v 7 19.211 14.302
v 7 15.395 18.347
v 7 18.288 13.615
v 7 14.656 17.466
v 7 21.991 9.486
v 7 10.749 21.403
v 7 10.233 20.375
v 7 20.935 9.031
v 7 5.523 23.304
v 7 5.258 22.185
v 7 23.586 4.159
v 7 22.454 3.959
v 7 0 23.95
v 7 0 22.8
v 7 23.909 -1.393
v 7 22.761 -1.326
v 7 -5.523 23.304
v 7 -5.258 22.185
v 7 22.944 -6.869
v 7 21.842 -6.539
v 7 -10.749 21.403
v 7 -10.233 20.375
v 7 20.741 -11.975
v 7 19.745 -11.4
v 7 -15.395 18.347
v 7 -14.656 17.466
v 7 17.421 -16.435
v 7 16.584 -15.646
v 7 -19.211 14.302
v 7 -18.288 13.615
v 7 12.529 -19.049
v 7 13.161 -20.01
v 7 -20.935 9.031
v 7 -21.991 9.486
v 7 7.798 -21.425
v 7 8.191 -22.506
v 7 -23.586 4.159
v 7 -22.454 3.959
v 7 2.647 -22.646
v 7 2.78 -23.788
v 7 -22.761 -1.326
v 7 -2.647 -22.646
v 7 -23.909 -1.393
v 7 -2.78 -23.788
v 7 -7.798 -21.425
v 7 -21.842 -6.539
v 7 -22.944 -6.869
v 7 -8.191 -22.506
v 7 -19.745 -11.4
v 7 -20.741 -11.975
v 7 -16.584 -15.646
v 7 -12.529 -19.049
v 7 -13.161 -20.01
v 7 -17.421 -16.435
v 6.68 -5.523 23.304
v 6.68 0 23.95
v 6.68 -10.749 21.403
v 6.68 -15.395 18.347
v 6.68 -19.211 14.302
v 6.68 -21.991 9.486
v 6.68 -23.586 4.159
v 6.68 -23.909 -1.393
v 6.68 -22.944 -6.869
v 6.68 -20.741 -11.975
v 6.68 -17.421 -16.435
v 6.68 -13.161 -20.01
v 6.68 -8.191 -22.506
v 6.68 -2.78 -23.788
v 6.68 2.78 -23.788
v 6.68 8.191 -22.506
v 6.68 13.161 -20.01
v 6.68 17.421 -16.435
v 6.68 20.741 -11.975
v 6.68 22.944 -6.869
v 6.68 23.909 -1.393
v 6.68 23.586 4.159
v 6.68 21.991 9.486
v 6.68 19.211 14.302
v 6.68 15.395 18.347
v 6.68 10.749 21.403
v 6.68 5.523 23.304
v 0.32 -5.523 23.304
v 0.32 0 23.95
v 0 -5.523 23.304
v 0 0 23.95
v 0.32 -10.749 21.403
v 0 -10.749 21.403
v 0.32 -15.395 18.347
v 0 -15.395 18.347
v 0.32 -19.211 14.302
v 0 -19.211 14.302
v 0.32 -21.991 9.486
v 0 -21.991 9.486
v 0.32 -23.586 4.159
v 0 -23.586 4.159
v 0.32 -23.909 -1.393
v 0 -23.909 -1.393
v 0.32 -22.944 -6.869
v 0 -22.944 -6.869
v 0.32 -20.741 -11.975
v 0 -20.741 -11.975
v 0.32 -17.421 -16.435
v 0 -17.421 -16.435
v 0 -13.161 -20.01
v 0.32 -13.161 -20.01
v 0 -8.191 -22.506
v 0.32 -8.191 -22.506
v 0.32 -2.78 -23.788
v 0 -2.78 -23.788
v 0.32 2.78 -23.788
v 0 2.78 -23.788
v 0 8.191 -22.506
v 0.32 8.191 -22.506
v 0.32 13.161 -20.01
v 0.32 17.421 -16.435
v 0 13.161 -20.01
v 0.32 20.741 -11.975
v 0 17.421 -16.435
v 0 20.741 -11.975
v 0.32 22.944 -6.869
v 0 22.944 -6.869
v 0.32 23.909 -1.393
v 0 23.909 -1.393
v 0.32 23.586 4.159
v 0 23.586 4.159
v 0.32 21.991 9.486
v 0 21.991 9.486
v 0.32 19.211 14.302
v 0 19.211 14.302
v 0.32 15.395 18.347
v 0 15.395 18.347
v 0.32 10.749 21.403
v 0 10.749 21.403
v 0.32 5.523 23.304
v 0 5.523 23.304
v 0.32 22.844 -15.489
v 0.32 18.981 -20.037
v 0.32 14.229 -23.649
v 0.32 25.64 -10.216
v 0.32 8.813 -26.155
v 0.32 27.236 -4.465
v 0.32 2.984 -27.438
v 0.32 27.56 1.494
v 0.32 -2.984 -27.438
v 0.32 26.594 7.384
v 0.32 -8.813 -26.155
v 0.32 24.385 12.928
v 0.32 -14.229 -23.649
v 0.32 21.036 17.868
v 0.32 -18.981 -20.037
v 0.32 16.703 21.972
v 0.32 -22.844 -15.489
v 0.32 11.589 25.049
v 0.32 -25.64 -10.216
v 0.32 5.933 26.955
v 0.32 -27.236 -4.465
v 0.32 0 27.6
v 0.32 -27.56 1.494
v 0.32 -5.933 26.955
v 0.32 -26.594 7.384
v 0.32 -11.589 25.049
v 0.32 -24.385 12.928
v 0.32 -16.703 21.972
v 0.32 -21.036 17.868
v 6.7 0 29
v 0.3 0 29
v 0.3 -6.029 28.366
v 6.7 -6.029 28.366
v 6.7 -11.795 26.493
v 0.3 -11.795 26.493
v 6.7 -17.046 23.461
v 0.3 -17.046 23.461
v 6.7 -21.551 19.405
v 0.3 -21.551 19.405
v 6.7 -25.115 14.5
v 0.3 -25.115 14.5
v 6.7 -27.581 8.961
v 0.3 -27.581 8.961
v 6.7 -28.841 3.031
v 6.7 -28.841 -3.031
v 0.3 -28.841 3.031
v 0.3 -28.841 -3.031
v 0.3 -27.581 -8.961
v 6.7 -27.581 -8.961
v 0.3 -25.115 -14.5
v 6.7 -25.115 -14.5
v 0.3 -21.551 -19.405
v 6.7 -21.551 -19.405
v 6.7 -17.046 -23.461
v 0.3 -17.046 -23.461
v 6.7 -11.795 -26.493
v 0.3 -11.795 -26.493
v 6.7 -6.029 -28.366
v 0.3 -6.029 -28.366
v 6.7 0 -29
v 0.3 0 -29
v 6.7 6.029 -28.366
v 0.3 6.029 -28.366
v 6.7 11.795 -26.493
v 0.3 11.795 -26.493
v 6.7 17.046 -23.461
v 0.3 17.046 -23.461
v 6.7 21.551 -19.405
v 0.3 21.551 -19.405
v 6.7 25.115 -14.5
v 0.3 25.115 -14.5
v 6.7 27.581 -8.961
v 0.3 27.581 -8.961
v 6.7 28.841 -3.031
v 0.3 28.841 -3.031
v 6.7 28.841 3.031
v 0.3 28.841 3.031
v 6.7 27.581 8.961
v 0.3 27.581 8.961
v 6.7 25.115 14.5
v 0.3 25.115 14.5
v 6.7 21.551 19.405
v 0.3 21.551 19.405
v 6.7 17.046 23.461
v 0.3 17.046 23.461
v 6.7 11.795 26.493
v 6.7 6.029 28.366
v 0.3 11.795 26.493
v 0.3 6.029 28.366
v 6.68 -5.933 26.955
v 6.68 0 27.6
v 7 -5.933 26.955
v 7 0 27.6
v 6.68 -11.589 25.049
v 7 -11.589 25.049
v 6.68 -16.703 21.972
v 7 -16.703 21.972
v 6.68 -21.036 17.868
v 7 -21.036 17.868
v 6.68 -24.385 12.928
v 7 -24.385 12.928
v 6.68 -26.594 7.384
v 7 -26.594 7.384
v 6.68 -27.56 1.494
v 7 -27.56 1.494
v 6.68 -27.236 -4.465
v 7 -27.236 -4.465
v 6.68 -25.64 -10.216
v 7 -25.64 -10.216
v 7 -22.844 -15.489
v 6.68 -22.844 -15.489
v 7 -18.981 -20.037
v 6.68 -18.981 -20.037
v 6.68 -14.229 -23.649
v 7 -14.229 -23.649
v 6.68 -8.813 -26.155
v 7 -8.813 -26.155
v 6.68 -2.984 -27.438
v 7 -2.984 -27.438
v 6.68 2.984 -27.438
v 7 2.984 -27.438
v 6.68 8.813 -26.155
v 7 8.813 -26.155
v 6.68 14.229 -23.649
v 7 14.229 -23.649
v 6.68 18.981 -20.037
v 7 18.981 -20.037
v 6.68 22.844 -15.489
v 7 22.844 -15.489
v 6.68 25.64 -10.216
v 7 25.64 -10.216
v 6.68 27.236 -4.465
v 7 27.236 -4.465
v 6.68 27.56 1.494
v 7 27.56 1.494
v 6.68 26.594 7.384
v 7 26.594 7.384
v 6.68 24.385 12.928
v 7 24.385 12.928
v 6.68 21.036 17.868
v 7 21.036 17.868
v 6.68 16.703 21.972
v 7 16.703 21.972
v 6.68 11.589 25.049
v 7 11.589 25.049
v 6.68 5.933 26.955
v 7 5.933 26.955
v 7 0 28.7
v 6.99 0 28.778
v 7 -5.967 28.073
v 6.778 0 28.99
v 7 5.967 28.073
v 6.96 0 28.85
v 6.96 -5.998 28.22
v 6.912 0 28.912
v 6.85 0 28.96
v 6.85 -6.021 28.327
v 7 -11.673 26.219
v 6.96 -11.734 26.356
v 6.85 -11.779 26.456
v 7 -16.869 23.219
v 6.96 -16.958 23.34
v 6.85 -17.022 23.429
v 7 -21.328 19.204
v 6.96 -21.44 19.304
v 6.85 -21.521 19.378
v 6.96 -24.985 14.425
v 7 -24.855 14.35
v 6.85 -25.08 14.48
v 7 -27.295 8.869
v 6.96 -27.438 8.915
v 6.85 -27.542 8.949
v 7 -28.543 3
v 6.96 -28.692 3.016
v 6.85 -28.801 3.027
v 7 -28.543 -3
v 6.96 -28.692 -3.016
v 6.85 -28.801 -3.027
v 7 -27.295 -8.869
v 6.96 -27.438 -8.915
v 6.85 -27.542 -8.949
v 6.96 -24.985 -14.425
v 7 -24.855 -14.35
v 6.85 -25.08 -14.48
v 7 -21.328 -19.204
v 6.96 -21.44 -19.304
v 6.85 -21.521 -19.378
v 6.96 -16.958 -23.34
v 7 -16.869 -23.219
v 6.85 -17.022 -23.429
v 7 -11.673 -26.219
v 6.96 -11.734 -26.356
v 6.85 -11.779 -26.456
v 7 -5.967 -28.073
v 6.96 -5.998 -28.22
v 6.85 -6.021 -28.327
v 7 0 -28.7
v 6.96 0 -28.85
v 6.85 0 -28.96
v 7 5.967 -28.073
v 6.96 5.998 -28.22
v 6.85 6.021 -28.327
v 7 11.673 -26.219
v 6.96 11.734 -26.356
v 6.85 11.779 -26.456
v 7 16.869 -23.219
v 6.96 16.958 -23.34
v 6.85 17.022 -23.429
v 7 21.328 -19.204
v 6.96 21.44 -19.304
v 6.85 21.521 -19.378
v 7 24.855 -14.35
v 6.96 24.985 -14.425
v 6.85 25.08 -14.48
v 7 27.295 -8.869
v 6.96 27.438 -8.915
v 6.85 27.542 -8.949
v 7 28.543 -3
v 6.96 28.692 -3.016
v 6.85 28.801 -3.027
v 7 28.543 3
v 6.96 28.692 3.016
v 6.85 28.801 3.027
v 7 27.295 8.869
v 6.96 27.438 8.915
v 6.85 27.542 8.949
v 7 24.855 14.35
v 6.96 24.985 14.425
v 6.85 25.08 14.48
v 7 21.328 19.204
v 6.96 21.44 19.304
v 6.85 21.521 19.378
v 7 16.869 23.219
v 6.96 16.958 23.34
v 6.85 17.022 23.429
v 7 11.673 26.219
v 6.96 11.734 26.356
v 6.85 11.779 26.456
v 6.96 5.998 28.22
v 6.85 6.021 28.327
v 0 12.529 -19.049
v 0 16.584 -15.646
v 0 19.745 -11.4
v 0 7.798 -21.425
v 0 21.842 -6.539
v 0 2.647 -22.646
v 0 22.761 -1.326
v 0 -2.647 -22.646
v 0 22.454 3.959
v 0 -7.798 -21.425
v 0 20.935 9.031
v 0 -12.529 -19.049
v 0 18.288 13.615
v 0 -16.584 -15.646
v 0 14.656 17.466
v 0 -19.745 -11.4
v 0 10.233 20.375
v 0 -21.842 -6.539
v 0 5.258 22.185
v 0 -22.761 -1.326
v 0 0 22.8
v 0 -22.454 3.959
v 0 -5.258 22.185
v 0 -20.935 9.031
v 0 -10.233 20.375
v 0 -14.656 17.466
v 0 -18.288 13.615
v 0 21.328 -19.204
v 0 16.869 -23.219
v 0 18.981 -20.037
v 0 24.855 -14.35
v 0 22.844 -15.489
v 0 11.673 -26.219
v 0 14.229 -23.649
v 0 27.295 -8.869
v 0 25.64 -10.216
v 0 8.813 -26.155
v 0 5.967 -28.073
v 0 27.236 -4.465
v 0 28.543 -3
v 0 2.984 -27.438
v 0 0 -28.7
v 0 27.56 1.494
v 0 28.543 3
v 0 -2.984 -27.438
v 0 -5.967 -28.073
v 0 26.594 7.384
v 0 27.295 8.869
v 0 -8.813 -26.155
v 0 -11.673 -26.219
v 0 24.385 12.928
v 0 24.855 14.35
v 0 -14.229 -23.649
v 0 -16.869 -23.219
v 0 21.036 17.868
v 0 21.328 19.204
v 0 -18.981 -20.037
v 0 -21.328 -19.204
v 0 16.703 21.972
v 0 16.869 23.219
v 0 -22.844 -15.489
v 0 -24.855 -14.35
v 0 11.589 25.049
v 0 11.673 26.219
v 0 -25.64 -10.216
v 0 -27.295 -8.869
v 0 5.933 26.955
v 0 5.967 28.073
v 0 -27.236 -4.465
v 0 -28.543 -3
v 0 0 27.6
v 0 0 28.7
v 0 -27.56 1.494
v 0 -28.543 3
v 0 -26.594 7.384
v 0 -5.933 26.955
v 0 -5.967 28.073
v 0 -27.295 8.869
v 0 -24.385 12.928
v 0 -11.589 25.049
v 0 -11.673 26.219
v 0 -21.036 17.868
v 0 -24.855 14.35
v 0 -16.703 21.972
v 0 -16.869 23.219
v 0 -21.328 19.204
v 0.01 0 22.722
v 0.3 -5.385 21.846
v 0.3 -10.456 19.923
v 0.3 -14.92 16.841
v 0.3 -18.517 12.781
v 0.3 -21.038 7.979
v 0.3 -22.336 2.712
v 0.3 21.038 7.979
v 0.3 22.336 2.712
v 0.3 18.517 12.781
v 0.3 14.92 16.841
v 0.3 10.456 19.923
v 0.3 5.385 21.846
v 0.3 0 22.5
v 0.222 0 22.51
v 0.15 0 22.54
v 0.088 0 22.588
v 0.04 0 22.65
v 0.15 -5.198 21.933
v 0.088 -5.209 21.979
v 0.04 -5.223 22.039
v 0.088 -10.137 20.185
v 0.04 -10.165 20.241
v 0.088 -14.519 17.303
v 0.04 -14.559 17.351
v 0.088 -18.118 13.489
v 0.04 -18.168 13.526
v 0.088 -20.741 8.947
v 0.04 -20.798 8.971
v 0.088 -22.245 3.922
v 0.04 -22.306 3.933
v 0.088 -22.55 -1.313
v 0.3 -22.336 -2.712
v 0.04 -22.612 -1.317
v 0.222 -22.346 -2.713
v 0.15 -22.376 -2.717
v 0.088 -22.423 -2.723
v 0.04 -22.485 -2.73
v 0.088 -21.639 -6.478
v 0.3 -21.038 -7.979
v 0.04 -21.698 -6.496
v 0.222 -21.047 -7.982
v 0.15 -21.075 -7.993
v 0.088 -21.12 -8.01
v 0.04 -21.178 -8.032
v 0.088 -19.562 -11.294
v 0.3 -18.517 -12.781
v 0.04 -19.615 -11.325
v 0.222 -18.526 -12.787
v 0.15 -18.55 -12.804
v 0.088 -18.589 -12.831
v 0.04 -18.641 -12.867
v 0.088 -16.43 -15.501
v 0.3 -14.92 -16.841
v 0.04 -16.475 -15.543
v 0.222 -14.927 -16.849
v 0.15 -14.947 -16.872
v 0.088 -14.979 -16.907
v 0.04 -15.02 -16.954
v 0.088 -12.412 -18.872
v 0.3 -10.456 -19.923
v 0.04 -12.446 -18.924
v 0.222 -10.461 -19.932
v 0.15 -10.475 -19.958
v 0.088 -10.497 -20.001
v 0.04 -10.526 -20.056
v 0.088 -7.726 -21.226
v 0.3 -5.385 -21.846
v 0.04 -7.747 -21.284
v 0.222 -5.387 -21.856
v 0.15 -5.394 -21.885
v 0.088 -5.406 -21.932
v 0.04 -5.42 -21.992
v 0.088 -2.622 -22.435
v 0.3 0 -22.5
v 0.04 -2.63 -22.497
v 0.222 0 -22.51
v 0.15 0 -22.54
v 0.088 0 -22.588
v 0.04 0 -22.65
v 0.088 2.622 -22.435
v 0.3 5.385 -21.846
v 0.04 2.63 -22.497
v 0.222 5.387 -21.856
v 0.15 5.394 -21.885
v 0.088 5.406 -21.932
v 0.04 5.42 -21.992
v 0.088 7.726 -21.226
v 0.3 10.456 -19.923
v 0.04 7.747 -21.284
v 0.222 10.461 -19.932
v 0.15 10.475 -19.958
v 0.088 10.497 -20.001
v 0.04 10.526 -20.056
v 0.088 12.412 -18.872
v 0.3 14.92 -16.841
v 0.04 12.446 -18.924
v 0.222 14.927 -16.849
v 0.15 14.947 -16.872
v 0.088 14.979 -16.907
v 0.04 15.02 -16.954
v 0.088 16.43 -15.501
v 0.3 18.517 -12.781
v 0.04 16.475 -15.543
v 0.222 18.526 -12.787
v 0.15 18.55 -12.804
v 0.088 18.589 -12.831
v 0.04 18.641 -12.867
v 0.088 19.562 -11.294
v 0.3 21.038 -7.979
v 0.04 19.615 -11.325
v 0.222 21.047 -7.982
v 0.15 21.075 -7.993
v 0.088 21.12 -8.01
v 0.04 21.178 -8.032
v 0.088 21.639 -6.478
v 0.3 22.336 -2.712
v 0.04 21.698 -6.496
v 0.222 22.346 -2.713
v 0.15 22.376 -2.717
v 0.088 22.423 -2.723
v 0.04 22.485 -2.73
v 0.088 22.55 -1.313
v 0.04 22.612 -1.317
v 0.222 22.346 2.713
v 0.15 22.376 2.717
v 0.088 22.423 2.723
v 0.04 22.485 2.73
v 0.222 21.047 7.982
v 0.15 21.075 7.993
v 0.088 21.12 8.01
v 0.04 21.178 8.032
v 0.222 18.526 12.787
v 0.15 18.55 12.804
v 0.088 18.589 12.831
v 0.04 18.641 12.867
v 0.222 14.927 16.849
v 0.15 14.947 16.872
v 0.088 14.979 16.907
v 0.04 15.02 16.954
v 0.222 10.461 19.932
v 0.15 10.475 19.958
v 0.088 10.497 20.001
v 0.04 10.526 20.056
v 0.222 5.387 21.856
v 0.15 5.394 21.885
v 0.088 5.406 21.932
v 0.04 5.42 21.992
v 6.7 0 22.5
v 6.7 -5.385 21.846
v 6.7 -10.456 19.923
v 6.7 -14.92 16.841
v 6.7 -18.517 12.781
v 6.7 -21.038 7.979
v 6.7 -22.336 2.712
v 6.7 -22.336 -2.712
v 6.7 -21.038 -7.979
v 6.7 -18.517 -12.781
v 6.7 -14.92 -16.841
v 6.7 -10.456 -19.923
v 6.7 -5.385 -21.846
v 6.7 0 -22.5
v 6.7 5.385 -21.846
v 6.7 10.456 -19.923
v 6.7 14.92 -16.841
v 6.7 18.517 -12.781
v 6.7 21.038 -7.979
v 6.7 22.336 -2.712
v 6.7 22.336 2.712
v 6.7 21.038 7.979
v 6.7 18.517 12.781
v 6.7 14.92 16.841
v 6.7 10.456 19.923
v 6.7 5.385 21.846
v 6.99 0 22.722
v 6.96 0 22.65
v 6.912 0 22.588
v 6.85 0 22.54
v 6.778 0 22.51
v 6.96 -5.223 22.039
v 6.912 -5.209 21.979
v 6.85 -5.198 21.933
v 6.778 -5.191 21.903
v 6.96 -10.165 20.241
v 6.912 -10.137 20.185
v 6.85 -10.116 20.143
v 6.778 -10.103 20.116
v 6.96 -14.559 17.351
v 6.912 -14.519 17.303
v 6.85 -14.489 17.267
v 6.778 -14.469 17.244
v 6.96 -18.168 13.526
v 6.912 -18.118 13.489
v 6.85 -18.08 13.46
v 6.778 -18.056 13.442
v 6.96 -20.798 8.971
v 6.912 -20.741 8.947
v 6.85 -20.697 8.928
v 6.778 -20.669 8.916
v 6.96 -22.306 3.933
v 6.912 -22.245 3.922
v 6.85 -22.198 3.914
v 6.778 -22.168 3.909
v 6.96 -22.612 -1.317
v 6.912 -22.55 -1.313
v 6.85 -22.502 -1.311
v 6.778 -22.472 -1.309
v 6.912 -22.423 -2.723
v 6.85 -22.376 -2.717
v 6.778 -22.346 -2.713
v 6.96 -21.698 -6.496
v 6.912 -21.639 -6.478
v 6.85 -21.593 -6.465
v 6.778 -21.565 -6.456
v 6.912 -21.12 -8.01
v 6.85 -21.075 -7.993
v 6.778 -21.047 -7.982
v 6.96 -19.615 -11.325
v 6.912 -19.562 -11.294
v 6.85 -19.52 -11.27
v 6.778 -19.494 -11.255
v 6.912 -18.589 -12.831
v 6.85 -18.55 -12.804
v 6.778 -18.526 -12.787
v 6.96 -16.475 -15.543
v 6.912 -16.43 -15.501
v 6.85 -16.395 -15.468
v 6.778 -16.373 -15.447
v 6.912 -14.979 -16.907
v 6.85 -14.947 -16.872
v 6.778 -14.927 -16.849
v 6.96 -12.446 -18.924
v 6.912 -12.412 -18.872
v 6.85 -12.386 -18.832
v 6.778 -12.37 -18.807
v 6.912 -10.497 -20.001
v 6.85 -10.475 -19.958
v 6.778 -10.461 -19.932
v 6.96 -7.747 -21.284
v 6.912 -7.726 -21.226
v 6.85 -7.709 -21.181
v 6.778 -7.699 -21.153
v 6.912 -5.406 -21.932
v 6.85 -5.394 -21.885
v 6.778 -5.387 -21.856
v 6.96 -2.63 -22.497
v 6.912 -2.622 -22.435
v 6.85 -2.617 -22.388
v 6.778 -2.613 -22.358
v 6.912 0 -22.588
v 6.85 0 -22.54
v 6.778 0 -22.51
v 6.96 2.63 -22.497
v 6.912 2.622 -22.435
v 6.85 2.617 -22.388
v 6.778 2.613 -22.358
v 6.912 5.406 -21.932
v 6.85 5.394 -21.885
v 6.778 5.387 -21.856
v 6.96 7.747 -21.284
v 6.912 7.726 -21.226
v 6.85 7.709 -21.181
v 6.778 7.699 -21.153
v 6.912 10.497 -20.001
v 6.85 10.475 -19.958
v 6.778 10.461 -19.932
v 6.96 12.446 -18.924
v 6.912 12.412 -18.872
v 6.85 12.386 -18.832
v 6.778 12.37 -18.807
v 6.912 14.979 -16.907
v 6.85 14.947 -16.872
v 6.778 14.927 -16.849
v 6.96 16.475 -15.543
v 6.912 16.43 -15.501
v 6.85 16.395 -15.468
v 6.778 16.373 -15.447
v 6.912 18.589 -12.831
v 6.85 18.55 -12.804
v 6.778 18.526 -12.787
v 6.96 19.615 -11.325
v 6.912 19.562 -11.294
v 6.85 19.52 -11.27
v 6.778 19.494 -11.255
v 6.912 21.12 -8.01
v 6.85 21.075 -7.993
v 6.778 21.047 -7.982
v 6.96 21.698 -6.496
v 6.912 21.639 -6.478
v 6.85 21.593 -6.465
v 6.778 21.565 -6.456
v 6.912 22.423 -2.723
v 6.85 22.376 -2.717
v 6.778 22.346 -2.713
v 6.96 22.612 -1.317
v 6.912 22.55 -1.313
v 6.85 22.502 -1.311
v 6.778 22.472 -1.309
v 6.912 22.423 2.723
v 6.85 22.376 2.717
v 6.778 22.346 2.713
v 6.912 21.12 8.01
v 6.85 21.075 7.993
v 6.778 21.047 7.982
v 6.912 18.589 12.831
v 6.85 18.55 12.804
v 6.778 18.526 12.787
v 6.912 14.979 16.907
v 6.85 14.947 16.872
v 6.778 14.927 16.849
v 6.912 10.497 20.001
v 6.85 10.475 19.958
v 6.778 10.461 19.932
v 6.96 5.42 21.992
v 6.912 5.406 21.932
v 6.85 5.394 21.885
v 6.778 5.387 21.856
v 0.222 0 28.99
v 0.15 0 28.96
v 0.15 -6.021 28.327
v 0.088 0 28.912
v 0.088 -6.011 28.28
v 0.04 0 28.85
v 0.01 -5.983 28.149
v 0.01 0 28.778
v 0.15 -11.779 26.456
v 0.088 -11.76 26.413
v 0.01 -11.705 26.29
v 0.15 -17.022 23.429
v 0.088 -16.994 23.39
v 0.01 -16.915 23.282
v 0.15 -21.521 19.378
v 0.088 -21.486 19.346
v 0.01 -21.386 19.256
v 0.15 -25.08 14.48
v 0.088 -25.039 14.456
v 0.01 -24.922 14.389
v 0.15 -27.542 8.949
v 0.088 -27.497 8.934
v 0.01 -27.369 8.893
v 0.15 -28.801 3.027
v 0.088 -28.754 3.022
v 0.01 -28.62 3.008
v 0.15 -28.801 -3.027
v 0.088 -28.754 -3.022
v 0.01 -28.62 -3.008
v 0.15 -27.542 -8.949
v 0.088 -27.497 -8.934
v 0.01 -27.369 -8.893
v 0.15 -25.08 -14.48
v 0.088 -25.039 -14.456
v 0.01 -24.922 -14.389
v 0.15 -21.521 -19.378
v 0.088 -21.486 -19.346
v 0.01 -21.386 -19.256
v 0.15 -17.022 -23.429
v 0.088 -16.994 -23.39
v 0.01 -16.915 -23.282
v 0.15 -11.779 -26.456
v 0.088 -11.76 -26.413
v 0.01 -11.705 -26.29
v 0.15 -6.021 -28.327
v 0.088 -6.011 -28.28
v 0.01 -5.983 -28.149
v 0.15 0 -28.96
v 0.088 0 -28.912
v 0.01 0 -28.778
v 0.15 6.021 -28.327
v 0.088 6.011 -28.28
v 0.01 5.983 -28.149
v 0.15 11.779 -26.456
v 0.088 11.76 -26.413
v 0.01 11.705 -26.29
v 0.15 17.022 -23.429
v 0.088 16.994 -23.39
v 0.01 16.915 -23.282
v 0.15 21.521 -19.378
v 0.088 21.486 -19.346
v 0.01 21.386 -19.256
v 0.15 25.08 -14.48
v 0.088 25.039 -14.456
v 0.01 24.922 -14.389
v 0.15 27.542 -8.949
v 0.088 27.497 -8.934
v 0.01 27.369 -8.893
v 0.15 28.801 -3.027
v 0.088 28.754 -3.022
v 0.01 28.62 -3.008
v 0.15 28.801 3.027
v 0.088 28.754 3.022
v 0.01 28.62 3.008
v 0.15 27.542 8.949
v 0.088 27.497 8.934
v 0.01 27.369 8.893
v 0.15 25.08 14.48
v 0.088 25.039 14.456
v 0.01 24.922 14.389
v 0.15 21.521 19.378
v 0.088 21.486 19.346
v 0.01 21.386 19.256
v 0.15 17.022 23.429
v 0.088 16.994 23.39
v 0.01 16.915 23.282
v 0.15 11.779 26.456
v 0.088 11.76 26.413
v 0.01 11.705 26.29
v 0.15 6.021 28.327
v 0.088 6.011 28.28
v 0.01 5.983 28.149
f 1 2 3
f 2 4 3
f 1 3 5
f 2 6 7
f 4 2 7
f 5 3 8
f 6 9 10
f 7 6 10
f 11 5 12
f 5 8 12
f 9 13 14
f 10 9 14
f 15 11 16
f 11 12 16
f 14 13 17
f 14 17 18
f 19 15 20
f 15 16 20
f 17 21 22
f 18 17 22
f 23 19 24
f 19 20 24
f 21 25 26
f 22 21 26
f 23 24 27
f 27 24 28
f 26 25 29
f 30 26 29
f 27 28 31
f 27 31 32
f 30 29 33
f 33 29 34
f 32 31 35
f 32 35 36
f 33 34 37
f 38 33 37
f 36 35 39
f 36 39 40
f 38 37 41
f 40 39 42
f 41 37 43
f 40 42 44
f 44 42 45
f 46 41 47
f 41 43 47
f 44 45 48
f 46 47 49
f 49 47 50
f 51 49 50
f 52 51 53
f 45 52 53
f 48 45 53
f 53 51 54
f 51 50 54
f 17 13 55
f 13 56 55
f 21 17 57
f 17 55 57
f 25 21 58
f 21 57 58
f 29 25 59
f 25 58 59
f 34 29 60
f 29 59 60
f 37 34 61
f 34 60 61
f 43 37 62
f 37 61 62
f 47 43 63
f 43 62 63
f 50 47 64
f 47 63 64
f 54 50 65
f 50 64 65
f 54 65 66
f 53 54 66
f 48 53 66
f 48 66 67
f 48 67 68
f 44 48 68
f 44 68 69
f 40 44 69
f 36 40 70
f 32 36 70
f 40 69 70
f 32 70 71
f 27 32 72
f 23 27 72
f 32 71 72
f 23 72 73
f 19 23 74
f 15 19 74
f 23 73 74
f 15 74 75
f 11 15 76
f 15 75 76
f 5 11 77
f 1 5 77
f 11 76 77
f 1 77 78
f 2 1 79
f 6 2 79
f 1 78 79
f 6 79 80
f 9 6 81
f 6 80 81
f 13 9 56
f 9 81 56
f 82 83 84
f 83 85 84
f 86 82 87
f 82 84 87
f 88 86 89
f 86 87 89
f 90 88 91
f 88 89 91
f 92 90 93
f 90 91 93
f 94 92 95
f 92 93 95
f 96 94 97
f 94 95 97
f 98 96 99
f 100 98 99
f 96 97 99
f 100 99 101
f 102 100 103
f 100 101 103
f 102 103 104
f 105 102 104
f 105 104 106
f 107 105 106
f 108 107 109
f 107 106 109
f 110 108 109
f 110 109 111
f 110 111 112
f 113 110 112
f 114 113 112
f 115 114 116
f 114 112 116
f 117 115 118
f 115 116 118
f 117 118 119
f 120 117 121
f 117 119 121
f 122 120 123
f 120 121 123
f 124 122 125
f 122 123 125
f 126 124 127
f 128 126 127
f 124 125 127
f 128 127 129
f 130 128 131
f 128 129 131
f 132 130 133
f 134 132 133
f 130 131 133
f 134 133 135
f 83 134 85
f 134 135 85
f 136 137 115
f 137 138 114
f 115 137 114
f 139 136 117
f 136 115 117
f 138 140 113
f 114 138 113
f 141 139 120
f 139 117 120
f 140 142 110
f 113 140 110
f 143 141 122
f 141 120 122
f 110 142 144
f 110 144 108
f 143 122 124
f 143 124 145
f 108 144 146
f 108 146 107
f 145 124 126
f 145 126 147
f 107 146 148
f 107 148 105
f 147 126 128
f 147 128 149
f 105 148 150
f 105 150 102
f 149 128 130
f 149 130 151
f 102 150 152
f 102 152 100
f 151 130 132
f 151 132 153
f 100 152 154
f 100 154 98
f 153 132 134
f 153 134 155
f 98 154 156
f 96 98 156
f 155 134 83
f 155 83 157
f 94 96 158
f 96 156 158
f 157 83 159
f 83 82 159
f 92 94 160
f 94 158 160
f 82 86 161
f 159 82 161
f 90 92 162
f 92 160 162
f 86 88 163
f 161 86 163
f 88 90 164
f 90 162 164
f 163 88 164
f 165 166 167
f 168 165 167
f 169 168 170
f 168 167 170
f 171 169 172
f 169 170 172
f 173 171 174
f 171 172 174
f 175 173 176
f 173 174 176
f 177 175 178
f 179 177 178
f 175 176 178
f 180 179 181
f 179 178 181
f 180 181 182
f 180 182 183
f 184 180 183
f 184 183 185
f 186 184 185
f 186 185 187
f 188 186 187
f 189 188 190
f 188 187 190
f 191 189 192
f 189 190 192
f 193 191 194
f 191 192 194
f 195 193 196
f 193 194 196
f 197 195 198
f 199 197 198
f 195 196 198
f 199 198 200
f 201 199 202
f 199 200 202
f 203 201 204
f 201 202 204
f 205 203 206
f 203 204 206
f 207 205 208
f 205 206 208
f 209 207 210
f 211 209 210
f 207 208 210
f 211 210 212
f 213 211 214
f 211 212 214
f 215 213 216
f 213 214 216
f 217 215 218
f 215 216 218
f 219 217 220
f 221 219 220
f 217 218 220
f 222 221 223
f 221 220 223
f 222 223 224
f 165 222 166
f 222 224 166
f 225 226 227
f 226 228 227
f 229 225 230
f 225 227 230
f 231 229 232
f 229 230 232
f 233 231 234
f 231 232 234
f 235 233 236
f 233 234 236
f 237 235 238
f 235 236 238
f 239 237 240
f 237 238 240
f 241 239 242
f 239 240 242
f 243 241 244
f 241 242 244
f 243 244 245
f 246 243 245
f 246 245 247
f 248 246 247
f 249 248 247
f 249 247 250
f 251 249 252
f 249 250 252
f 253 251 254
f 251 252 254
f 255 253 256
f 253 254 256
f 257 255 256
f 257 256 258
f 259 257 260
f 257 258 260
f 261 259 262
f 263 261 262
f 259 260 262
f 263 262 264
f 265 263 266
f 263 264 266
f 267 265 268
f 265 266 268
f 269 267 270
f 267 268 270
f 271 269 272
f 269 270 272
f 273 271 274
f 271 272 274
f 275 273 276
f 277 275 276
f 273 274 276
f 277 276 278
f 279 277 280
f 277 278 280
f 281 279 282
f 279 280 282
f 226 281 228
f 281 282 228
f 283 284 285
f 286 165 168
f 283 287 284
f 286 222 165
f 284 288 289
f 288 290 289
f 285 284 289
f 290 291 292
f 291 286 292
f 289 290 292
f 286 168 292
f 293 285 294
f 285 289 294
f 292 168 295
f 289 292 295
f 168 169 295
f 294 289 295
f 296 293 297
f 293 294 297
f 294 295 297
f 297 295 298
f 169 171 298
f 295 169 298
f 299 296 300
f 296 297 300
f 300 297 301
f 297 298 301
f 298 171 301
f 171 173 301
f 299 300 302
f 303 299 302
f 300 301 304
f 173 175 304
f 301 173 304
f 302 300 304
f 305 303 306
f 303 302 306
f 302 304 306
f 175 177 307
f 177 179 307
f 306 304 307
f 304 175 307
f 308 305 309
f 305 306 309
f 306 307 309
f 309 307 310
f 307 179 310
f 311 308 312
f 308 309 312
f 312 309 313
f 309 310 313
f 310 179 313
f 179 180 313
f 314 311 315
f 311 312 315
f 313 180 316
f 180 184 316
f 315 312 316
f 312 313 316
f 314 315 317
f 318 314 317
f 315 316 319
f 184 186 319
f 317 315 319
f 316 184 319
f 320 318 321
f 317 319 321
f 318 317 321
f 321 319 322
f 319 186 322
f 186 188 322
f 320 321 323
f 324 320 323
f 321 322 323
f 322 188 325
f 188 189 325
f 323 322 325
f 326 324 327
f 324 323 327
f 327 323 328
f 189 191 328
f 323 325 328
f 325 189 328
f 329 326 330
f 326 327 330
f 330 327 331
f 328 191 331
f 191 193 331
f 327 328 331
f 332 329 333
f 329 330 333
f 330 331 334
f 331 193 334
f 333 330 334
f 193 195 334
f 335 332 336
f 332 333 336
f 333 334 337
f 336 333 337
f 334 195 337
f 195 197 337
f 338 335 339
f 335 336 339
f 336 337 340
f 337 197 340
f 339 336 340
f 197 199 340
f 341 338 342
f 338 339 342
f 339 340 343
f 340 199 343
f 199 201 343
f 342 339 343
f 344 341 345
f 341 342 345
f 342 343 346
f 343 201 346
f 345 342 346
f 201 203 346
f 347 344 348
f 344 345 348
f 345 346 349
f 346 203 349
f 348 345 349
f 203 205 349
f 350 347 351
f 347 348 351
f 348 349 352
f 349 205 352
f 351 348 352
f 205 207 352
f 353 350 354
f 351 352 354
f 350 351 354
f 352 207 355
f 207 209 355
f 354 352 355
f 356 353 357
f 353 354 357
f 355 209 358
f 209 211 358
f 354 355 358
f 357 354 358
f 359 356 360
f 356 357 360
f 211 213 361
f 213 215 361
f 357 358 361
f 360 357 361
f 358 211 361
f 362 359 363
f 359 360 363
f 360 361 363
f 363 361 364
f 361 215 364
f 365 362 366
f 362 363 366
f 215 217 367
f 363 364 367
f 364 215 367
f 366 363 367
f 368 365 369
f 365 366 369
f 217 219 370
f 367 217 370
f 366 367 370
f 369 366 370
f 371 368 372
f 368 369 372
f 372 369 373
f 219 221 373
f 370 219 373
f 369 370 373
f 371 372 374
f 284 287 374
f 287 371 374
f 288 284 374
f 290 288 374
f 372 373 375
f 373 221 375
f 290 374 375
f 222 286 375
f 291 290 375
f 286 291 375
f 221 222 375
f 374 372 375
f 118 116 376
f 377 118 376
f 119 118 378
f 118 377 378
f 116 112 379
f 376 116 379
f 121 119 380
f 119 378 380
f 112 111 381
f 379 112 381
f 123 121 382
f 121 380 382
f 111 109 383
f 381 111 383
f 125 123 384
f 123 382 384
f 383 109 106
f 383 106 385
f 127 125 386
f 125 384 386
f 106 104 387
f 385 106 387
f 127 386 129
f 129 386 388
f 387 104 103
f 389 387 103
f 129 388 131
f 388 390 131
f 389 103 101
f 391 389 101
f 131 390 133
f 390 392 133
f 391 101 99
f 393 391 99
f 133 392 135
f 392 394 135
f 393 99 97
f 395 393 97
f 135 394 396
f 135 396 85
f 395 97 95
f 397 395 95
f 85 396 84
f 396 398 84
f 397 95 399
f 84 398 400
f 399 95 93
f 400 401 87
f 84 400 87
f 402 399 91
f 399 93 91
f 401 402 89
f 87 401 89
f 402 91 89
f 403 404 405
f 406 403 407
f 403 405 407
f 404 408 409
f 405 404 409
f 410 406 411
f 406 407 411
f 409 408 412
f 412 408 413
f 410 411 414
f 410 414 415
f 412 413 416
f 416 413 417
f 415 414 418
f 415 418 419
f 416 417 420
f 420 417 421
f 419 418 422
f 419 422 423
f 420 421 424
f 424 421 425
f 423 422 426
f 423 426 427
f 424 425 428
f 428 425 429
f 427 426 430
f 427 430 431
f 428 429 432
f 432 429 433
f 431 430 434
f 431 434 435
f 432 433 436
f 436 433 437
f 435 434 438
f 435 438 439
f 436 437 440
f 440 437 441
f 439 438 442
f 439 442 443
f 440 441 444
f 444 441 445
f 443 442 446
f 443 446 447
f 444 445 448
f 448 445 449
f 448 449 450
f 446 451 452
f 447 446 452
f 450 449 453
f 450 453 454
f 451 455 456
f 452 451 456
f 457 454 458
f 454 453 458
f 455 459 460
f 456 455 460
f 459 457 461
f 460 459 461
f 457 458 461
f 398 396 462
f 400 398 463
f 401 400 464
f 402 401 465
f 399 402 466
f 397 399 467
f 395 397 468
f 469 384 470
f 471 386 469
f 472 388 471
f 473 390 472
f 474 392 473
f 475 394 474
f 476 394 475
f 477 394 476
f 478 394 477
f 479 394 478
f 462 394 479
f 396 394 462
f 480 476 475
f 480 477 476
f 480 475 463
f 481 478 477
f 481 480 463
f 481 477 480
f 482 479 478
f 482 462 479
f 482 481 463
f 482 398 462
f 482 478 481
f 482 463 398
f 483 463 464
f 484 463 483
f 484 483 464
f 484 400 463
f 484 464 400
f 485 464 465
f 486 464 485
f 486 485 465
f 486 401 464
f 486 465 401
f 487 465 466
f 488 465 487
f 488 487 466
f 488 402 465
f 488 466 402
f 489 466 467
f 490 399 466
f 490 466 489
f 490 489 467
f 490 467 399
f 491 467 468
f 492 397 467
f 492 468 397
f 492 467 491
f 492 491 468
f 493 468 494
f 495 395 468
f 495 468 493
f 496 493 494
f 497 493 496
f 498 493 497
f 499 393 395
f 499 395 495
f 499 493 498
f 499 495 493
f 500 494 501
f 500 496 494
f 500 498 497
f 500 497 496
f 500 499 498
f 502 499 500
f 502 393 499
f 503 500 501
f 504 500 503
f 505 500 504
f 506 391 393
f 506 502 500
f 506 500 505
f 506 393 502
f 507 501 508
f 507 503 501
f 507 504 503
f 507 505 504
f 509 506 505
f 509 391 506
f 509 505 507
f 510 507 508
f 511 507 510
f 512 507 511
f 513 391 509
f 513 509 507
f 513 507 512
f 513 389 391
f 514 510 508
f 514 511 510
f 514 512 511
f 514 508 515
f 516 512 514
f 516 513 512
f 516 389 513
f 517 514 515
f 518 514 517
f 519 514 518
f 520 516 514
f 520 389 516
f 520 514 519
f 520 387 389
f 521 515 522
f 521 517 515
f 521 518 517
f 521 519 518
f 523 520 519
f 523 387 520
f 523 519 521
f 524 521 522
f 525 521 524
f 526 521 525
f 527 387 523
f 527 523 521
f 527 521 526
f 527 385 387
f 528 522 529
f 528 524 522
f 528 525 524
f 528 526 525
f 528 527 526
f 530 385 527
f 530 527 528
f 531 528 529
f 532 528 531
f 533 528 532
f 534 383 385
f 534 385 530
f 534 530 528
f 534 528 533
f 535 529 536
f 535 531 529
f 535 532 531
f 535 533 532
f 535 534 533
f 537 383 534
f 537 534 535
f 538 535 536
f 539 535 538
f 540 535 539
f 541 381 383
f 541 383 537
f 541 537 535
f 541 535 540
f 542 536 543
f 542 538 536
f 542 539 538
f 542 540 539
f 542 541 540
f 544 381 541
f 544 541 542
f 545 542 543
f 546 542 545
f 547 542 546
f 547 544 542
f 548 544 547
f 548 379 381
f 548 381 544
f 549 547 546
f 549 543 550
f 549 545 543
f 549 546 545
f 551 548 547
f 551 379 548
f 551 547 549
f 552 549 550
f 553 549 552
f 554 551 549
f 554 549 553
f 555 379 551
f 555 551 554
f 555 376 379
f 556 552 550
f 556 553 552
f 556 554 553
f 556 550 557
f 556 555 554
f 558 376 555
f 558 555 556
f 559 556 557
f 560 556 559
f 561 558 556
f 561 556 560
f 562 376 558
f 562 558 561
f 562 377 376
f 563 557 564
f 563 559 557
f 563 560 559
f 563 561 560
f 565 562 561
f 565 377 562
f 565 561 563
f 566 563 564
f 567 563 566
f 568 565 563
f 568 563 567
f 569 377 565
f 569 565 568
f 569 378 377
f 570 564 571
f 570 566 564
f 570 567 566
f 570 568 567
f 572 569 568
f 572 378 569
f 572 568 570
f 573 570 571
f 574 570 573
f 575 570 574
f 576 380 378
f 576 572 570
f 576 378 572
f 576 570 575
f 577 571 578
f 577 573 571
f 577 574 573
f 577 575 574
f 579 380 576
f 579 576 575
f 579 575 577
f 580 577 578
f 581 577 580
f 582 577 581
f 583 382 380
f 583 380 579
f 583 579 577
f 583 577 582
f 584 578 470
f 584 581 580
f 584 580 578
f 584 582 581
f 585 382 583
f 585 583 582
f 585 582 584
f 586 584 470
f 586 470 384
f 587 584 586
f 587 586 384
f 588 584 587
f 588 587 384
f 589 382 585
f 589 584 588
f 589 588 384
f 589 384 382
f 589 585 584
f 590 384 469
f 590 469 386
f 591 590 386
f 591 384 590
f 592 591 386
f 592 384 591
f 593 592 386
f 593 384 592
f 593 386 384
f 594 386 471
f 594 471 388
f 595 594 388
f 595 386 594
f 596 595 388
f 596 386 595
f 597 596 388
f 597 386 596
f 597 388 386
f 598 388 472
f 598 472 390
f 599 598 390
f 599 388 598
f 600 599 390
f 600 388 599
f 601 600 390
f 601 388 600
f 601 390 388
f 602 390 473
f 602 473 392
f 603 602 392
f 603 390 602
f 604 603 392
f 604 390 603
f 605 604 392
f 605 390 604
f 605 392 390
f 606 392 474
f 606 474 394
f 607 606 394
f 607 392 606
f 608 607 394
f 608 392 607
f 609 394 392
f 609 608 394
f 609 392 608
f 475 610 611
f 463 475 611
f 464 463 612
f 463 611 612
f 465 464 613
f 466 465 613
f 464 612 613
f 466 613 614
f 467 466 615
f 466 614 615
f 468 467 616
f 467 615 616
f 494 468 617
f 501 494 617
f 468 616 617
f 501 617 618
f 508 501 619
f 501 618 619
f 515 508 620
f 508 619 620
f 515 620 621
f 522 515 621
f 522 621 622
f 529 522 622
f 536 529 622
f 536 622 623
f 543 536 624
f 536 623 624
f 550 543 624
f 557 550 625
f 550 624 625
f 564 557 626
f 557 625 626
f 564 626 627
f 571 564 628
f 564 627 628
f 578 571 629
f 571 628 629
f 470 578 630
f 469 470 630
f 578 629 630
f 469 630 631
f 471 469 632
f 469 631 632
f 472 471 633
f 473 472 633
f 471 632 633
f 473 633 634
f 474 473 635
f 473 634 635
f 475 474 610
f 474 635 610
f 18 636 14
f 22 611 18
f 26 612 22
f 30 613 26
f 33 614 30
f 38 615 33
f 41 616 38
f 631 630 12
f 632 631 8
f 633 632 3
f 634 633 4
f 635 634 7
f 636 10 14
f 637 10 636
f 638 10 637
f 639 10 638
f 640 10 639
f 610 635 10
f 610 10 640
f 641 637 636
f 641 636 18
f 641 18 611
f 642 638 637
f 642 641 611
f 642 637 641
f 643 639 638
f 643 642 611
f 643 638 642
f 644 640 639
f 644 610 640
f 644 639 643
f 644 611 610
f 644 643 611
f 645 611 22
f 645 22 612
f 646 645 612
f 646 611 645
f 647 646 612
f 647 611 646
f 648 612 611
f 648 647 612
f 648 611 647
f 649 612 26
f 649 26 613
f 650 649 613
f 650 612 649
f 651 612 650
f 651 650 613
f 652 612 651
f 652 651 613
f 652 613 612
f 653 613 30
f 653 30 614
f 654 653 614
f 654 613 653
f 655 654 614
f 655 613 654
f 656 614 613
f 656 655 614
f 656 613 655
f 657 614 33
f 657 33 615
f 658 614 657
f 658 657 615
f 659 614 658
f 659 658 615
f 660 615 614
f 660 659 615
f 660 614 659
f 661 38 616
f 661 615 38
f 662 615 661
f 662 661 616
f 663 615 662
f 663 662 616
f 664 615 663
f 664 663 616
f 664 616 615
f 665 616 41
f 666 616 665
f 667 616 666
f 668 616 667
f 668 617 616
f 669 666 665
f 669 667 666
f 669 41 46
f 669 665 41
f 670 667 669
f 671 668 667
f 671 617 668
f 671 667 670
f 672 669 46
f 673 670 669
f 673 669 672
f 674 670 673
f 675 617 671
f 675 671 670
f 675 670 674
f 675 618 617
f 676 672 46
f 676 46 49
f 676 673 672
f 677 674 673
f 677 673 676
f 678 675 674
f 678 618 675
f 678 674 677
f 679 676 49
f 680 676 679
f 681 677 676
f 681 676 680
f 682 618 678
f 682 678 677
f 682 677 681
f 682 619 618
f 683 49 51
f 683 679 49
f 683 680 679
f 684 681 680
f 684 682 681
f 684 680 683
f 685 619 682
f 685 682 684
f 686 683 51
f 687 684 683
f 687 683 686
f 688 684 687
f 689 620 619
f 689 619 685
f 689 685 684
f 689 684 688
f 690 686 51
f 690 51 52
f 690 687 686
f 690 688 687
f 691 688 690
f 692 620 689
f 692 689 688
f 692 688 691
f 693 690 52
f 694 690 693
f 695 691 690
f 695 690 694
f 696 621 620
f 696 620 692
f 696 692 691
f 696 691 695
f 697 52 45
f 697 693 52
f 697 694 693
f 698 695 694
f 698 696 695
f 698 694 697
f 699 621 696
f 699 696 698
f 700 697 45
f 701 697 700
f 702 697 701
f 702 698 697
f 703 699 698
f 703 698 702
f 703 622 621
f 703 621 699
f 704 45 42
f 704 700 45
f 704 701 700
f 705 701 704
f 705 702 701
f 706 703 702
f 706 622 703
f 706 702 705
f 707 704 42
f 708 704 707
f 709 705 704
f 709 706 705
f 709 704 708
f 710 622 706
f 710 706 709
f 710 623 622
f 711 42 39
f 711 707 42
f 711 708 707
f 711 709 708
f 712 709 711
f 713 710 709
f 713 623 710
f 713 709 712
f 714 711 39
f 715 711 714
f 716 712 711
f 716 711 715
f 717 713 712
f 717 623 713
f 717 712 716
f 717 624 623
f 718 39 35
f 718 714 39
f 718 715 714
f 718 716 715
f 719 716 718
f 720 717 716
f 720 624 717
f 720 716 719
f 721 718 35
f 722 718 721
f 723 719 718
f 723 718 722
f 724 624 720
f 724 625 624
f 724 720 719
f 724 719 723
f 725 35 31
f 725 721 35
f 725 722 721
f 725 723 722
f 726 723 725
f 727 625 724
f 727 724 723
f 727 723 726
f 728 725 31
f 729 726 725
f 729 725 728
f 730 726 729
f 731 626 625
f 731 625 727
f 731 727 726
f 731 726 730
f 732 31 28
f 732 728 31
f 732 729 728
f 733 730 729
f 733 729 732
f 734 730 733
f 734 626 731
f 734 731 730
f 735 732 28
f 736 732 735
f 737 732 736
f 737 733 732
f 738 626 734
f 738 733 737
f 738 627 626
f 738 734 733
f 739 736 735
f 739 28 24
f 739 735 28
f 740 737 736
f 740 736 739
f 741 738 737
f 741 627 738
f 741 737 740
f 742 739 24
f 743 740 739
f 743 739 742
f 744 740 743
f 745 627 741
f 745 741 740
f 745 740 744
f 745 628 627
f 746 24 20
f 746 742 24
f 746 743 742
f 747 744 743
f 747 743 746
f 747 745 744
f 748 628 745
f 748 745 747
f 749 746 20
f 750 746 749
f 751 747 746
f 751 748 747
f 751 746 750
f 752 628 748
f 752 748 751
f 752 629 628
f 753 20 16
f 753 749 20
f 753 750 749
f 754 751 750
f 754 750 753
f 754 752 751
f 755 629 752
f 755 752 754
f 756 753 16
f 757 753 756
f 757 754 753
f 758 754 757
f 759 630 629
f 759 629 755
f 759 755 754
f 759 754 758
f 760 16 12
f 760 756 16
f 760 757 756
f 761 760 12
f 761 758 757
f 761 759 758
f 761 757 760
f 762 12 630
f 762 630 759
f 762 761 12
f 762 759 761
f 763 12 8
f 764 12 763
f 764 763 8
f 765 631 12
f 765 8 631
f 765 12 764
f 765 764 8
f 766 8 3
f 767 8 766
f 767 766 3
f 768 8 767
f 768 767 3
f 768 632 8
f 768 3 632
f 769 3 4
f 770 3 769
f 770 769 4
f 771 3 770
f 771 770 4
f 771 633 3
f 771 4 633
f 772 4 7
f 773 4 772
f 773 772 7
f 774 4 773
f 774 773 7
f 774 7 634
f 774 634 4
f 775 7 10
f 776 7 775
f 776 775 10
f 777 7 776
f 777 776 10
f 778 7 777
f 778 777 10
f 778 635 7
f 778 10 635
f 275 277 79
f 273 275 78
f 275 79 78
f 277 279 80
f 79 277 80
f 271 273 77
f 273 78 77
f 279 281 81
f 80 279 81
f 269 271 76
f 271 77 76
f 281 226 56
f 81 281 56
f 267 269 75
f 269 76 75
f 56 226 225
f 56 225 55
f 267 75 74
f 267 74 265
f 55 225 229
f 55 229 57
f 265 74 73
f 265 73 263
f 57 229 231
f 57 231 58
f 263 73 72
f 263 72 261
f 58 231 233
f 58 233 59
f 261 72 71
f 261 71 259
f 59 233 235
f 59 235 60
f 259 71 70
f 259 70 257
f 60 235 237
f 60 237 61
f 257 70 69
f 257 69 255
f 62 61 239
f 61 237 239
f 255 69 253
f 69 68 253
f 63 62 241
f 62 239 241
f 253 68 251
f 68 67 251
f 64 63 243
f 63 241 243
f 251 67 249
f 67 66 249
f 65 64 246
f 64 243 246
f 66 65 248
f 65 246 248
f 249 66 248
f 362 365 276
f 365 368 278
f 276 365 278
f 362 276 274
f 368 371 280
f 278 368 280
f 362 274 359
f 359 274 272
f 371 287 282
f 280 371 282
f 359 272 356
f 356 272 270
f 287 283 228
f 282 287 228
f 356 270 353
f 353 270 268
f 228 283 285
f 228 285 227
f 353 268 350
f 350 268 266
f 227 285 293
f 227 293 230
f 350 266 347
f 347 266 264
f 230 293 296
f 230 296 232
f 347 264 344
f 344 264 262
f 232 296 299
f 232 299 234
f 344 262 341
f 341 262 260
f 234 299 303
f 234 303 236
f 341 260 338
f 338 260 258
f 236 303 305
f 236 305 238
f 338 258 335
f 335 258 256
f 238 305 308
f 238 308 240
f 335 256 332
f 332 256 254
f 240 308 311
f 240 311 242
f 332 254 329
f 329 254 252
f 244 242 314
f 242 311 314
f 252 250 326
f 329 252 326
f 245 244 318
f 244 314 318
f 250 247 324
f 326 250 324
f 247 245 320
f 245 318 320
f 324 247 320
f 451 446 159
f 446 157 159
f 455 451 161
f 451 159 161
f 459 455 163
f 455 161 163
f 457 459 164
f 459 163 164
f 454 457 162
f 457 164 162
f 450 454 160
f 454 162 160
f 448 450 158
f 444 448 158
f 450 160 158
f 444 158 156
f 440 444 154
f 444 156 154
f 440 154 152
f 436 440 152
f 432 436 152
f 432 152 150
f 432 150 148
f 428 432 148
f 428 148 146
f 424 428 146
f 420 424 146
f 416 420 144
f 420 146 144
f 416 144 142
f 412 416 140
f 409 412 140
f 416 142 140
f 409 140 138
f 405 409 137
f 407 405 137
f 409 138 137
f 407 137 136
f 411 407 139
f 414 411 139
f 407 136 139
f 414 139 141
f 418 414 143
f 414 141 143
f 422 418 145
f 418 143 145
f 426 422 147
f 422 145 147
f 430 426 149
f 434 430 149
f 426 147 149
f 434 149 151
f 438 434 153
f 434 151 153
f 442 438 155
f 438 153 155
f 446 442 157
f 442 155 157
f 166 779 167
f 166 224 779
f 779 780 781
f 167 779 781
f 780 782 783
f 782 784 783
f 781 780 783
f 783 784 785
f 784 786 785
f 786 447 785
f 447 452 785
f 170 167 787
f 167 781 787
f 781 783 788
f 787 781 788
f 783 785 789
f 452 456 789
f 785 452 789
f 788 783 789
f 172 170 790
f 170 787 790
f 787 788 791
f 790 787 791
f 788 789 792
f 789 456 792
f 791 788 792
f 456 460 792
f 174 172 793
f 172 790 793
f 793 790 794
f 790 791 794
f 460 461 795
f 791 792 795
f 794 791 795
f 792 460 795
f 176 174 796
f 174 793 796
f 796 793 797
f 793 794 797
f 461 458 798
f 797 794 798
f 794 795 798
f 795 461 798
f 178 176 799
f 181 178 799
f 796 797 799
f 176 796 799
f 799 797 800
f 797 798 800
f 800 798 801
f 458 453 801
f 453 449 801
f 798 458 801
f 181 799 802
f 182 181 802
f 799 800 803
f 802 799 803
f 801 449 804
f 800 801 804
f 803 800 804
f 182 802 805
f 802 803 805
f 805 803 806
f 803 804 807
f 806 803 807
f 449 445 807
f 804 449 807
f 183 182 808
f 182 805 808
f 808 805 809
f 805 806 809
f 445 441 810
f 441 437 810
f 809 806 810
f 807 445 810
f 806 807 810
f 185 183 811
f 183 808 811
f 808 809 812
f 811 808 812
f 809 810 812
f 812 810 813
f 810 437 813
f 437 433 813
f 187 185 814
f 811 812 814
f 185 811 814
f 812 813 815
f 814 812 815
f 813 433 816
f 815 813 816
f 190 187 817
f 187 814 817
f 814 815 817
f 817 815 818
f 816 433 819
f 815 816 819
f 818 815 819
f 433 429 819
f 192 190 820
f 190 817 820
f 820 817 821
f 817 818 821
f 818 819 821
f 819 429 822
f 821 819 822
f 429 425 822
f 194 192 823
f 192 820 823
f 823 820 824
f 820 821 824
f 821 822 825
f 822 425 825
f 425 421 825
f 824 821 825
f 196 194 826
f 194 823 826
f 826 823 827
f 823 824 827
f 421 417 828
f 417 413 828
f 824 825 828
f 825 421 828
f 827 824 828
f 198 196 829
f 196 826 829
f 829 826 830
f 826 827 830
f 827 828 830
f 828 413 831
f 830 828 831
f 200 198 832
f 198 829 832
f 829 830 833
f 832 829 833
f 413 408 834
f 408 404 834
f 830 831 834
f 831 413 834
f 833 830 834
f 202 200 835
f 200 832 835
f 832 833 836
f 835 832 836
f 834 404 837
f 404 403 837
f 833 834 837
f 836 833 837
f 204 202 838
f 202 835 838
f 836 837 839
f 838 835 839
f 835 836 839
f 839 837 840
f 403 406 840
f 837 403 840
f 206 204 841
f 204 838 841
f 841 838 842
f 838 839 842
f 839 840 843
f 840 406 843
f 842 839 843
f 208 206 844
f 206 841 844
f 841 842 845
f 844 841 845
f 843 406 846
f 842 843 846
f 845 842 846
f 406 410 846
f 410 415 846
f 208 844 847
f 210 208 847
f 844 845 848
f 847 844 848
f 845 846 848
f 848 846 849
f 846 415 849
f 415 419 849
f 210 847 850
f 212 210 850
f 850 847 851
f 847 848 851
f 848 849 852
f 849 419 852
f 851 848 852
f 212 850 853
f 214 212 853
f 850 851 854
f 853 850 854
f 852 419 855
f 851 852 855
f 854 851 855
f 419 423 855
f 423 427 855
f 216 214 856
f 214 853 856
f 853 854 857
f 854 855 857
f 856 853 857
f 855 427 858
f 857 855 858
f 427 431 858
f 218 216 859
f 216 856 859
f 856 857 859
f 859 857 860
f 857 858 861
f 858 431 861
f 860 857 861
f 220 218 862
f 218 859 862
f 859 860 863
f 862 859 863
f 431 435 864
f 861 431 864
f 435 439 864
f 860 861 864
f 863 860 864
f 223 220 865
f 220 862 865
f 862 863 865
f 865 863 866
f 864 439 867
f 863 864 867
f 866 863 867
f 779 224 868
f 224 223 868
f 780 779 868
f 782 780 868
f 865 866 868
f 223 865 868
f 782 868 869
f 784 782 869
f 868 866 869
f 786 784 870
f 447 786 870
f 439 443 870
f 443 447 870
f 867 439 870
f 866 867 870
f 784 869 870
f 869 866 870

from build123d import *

# Parameters (mm, degrees)
FILLET1_R = 0.3
FILLET2_R = 0.3


with BuildPart() as part:
    # Sketch1 → Revolve1 (revolve)
    with BuildSketch(Plane.XY, mode=Mode.PRIVATE) as revolve1_sk:
        Polygon((0, 22.5), (7, 22.5), (7, 23.95), (6.68, 23.95), (6.68, 27.6), (7, 27.6), (7, 29), (0, 29), (0, 27.6), (0.32, 27.6), (0.32, 23.95), (0, 23.95), align=None)
    revolve(revolve1_sk.sketch.rotate(Axis((0, 0, 0), (1, 0, 0)), 90), axis=Axis((0, 0, 0), (1, 0, 0)))

    # Fillet1
    fillet1_edges = [part.edges().sort_by_distance(p)[0] for p in [
        (0, 0, -29),
        (7, 0, -29),
    ]]
    fillet(fillet1_edges, radius=FILLET1_R)

    # Fillet2
    fillet2_edges = [part.edges().sort_by_distance(p)[0] for p in [
        (7, 0, -22.5),
        (0, 0, -22.5),
    ]]
    fillet(fillet2_edges, radius=FILLET2_R)


solid = part.part
